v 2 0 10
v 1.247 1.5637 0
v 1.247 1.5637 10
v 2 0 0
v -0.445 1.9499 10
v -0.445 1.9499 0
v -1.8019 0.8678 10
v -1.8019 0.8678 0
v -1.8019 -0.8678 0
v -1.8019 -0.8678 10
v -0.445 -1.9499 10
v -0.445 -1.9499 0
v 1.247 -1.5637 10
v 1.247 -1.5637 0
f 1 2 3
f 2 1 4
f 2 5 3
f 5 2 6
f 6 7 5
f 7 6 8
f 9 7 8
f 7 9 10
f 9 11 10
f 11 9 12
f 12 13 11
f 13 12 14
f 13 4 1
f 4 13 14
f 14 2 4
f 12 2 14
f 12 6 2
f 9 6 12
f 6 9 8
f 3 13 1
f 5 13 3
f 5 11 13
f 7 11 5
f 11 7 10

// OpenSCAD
// file: v3/mount.scad
/**
 * mount ideas for using in Raspberry Pi 
 * Projects.
 */

/* 1 unit is one cm */
module Mount() {
    cylinder(10,2,2);
}
// main file
/**
 * test-v3.scad
 */
 include <v3/mount.scad>

 /* Test the parts in v3 */
Mount();
